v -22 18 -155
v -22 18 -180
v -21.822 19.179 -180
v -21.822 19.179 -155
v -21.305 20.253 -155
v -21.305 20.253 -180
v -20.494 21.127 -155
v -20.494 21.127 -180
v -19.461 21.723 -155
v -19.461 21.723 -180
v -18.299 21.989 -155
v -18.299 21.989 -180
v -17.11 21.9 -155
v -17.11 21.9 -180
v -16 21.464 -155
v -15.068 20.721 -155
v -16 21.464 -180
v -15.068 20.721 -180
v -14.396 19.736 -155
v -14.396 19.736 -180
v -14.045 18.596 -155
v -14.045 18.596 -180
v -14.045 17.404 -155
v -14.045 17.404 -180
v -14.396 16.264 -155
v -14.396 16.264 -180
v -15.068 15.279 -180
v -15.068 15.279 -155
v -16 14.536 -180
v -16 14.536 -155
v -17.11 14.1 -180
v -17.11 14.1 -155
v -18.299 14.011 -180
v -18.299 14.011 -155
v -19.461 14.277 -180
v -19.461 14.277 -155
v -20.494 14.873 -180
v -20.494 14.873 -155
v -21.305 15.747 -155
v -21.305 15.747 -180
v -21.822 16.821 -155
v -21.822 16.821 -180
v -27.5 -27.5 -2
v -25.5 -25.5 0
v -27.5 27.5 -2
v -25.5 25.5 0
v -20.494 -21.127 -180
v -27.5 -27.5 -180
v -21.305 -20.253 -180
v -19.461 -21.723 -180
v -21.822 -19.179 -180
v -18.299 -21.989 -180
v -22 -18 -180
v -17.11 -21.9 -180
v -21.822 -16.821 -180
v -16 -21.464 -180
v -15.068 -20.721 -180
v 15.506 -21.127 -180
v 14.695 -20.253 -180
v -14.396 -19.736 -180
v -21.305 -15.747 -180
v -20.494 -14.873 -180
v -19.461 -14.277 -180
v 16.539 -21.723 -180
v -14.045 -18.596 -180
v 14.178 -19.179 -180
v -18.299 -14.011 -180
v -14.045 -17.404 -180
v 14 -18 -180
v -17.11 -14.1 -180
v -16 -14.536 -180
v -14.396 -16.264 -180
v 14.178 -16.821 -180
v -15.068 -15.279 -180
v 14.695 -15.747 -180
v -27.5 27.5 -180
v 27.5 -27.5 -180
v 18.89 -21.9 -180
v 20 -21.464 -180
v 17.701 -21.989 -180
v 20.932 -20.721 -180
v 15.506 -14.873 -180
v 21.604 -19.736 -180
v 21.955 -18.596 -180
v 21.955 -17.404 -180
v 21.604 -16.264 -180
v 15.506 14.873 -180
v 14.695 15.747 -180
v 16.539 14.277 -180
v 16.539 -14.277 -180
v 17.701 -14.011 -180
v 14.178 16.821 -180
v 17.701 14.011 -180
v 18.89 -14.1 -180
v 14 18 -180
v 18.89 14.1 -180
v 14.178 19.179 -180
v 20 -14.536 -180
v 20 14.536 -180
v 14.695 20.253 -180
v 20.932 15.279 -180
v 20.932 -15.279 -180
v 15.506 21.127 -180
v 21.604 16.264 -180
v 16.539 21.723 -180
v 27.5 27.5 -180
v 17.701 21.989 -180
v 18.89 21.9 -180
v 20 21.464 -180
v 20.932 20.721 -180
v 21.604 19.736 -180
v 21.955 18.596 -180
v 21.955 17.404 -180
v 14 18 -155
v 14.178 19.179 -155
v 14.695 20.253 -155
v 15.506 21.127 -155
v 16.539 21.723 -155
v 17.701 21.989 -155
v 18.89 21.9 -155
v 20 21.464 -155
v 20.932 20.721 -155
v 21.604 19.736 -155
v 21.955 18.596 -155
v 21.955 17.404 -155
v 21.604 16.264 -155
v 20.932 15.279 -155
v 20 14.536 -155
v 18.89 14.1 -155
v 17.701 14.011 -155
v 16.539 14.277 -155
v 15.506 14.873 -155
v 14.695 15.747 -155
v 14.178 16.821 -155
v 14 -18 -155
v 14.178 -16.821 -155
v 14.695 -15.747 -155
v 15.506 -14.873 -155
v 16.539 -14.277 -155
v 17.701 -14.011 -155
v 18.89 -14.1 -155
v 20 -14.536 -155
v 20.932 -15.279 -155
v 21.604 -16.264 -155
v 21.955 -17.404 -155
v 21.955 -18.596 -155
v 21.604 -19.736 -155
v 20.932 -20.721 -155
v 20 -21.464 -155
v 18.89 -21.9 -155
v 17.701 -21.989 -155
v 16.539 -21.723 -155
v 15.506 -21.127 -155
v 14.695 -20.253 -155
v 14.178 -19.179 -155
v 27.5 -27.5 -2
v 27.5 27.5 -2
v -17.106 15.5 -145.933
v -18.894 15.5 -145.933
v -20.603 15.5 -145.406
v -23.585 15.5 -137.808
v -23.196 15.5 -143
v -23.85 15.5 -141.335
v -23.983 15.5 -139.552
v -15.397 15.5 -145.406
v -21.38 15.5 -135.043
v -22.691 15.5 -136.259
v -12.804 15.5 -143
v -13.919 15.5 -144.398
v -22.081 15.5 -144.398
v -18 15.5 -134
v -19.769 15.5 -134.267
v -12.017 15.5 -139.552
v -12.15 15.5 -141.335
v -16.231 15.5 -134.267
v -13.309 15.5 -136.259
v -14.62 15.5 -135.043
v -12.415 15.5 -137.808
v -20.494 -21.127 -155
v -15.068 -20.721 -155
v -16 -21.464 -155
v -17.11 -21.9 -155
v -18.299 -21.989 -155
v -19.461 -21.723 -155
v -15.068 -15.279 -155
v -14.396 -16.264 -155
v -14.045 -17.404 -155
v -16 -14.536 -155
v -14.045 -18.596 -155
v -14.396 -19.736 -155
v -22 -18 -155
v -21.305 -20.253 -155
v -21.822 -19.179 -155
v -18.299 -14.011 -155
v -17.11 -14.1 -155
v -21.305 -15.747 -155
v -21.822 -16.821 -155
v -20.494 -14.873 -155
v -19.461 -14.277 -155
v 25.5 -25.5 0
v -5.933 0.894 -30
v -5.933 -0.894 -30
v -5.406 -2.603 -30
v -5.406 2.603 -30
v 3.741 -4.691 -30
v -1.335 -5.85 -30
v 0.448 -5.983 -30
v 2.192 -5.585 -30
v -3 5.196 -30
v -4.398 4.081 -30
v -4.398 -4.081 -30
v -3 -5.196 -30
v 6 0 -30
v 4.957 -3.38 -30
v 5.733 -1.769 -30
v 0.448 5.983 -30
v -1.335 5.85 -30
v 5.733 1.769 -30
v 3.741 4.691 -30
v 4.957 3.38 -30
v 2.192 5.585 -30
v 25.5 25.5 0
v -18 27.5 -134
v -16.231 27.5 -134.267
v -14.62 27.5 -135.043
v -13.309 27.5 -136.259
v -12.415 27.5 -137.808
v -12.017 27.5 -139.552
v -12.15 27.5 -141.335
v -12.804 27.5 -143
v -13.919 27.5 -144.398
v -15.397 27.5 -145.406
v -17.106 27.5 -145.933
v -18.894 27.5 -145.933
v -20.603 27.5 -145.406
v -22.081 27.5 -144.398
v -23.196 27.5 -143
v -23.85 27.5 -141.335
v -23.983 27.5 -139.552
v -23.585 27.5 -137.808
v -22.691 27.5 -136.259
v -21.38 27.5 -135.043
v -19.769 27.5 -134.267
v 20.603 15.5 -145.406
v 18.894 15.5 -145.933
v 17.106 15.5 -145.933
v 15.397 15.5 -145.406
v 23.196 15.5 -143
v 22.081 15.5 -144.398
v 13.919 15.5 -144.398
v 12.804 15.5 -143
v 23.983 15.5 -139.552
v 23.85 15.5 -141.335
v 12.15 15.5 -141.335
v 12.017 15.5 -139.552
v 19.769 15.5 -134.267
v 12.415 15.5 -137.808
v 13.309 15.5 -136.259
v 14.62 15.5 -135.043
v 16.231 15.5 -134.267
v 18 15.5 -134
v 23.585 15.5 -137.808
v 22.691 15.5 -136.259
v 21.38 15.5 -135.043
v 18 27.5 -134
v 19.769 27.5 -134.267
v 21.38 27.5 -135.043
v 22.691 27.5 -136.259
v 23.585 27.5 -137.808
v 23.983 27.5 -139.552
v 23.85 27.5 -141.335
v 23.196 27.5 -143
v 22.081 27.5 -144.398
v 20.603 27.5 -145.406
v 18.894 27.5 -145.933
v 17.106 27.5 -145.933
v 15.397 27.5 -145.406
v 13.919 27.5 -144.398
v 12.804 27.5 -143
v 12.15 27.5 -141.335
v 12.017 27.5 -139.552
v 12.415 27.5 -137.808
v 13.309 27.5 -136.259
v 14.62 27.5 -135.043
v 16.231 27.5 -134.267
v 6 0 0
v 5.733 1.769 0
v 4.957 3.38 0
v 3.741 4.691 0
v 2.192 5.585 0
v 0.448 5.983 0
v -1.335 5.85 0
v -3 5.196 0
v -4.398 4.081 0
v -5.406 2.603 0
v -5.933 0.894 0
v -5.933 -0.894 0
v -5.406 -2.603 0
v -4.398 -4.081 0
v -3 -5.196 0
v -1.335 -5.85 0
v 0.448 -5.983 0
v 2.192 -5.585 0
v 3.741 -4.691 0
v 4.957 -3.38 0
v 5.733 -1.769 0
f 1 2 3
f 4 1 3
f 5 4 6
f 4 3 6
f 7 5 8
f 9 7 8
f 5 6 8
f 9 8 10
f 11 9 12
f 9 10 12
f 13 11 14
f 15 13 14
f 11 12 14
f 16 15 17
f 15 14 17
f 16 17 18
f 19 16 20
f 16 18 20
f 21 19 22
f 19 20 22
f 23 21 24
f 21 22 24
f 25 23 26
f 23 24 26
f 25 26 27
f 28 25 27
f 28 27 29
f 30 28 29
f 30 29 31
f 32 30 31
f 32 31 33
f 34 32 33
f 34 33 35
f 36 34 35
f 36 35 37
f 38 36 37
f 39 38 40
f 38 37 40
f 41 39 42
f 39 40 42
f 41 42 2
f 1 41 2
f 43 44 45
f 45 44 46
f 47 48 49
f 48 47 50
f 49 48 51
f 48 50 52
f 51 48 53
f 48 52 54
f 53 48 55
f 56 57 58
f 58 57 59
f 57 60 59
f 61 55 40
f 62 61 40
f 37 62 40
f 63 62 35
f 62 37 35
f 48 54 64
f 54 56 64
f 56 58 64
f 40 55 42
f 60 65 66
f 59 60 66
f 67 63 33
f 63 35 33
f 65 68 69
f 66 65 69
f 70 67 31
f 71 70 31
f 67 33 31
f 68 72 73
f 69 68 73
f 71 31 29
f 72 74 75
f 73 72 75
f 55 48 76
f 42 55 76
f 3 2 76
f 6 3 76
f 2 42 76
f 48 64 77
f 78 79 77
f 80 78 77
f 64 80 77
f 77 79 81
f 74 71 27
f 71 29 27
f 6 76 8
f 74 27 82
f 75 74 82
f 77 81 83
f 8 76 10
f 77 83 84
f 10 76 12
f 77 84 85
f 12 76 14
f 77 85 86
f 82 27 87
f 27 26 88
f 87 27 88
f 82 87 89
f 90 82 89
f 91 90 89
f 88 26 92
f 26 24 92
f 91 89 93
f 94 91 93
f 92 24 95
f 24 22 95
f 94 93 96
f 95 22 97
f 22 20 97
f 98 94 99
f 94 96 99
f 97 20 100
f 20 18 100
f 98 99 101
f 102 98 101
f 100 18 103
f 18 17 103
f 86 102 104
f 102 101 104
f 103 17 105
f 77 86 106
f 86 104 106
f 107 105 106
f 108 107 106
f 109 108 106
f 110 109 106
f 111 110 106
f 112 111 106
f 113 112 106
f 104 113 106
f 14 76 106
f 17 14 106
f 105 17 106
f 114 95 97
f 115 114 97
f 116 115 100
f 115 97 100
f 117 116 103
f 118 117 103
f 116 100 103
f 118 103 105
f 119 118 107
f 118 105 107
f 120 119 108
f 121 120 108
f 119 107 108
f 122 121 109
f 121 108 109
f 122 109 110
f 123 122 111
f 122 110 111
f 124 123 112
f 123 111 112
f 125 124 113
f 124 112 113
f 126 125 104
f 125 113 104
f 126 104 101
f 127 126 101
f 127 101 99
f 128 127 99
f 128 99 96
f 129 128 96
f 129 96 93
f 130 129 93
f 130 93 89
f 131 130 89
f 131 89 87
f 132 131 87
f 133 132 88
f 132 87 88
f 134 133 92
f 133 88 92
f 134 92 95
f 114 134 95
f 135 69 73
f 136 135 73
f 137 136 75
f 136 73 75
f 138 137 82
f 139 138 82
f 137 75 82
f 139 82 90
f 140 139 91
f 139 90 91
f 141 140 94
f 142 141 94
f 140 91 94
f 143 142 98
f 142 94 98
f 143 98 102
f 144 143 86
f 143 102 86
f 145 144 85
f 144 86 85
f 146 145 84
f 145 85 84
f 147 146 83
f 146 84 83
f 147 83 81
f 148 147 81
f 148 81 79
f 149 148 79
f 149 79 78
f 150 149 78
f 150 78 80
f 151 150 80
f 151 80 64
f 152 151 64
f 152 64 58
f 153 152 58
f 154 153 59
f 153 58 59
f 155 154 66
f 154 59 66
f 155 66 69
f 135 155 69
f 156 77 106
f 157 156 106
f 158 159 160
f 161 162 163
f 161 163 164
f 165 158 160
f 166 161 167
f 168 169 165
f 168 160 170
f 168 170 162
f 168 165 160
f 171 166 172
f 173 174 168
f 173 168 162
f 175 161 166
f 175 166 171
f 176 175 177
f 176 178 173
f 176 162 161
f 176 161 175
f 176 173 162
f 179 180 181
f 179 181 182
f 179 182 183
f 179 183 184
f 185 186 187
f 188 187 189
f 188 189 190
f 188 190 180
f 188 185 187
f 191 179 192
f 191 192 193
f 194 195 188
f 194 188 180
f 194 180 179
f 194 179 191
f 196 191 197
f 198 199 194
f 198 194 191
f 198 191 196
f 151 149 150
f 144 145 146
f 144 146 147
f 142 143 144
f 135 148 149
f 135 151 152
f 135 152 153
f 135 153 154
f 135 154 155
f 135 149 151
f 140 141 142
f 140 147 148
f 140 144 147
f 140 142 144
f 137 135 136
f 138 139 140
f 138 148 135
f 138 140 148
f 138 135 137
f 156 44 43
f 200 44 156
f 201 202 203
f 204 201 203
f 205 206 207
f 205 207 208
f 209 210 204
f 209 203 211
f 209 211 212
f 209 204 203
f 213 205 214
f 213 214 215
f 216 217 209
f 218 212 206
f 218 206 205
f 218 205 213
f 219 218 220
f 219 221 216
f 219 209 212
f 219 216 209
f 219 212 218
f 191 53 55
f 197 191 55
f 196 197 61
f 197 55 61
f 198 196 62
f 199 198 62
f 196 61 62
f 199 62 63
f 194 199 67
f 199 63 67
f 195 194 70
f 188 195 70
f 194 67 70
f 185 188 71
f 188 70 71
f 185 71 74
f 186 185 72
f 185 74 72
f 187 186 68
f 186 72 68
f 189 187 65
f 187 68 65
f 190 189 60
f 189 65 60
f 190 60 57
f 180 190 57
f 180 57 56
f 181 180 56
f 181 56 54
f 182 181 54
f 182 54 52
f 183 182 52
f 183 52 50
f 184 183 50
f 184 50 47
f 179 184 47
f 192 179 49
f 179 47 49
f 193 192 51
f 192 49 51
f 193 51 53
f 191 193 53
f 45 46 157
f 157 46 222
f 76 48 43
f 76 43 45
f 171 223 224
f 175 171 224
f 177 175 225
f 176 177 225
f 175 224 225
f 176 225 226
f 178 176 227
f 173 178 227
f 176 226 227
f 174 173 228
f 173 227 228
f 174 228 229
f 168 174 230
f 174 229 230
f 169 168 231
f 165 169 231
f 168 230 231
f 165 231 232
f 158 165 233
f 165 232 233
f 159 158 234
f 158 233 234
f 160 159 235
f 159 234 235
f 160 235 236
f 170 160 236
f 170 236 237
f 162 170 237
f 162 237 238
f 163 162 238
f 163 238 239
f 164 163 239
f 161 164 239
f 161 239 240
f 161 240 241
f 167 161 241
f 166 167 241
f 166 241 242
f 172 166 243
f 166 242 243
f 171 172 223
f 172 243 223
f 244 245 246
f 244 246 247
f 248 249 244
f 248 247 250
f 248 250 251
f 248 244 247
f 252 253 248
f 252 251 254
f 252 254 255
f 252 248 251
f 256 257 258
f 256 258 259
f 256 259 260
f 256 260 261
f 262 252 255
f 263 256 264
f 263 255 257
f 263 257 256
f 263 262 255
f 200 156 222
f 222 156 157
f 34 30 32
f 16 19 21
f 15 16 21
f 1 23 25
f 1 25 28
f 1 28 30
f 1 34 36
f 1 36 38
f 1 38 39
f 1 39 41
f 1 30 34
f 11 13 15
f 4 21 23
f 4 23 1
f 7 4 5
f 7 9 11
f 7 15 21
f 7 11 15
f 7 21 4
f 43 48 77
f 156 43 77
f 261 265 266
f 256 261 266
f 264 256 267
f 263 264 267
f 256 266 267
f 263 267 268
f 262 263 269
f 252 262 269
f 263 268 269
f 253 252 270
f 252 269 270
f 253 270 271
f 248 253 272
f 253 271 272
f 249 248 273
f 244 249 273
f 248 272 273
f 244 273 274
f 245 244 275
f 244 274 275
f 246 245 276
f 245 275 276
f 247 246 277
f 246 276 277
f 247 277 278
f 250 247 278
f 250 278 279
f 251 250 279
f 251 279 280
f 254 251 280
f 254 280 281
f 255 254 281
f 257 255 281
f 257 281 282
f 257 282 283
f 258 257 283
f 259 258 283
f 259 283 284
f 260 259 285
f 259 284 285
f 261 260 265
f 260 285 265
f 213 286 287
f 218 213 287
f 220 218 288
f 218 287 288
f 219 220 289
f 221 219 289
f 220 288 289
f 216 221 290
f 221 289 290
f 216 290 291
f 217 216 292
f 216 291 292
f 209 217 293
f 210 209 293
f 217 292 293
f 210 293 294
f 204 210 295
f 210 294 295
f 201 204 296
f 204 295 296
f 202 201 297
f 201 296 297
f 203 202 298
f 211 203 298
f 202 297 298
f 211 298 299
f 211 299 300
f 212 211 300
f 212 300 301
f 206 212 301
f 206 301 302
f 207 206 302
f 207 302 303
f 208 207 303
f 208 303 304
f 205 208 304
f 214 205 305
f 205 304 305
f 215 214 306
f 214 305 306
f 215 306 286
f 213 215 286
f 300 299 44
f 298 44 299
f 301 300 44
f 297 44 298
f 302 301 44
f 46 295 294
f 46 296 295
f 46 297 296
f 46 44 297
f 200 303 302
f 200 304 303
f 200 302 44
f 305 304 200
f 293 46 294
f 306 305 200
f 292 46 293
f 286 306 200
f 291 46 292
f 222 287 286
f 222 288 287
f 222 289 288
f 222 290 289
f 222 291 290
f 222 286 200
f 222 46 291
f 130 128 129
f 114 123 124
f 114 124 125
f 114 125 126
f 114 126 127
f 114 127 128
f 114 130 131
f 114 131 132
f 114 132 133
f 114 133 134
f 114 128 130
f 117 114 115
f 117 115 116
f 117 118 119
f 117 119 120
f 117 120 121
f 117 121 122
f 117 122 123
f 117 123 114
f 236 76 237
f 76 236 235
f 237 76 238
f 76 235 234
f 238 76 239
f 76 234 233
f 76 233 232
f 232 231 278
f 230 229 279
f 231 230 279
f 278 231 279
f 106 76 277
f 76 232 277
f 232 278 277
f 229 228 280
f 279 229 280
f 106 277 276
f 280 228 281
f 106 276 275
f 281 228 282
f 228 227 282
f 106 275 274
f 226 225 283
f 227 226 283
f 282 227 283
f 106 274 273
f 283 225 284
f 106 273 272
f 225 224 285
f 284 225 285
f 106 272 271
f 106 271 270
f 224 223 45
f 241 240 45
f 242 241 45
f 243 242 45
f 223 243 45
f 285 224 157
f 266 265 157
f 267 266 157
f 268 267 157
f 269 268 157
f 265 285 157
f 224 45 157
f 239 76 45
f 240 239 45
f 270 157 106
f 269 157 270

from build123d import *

# Parameters (mm, degrees)
CROQUIS1_W              = 55
CROQUIS1_H              = 55
SALIENTE_EXTRUIR1_DEPTH = 180
CROQUIS2_R              = 6
CORTAR_EXTRUIR1_DEPTH   = 30
CROQUIS3_R              = 4
CORTAR_EXTRUIR2_DEPTH   = 25
CROQUIS6_R              = 6
CORTAR_EXTRUIR5_DEPTH   = 12
CHAFL_N1_SIZE           = 2


with BuildPart() as part:
    # Croquis1 → Saliente-Extruir1 (new body)
    with BuildSketch(Plane.XY):
        Rectangle(CROQUIS1_W, CROQUIS1_H)
    extrude(amount=-SALIENTE_EXTRUIR1_DEPTH)

    # Croquis2 → Cortar-Extruir1 (cut)
    with BuildSketch(Plane.XY):
        Circle(CROQUIS2_R)
    extrude(amount=-CORTAR_EXTRUIR1_DEPTH, mode=Mode.SUBTRACT)

    # Croquis3 → Cortar-Extruir2 (cut)
    with BuildSketch(Plane(origin=(0, 0, -180), x_dir=(-1, 0, 0), z_dir=(0, 0, -1))):
        with Locations((18, 18)):
            Circle(CROQUIS3_R)
        with Locations((-18, 18)):
            Circle(CROQUIS3_R)
        with Locations((-18, -18)):
            Circle(CROQUIS3_R)
        with Locations((18, -18)):
            Circle(CROQUIS3_R)
    extrude(amount=-CORTAR_EXTRUIR2_DEPTH, mode=Mode.SUBTRACT)

    # Croquis6 → Cortar-Extruir5 (cut)
    with BuildSketch(Plane(origin=(0, 27.5, 0), x_dir=(1, 0, 0), z_dir=(0, 1, 0))):
        with Locations(Location((-18, 140, 0), (0, 0, 270))):
            Circle(CROQUIS6_R)
        with Locations(Location((18, 140, 0), (0, 0, 270))):
            Circle(CROQUIS6_R)
    extrude(amount=-CORTAR_EXTRUIR5_DEPTH, mode=Mode.SUBTRACT)

    # Chaflán1
    chafl_n1_edges = [part.edges().sort_by_distance(p)[0] for p in [
        (0, -27.5, 0),
        (-27.5, 0, 0),
        (0, 27.5, 0),
        (27.5, 0, 0),
    ]]
    chamfer(chafl_n1_edges, length=CHAFL_N1_SIZE)


solid = part.part
